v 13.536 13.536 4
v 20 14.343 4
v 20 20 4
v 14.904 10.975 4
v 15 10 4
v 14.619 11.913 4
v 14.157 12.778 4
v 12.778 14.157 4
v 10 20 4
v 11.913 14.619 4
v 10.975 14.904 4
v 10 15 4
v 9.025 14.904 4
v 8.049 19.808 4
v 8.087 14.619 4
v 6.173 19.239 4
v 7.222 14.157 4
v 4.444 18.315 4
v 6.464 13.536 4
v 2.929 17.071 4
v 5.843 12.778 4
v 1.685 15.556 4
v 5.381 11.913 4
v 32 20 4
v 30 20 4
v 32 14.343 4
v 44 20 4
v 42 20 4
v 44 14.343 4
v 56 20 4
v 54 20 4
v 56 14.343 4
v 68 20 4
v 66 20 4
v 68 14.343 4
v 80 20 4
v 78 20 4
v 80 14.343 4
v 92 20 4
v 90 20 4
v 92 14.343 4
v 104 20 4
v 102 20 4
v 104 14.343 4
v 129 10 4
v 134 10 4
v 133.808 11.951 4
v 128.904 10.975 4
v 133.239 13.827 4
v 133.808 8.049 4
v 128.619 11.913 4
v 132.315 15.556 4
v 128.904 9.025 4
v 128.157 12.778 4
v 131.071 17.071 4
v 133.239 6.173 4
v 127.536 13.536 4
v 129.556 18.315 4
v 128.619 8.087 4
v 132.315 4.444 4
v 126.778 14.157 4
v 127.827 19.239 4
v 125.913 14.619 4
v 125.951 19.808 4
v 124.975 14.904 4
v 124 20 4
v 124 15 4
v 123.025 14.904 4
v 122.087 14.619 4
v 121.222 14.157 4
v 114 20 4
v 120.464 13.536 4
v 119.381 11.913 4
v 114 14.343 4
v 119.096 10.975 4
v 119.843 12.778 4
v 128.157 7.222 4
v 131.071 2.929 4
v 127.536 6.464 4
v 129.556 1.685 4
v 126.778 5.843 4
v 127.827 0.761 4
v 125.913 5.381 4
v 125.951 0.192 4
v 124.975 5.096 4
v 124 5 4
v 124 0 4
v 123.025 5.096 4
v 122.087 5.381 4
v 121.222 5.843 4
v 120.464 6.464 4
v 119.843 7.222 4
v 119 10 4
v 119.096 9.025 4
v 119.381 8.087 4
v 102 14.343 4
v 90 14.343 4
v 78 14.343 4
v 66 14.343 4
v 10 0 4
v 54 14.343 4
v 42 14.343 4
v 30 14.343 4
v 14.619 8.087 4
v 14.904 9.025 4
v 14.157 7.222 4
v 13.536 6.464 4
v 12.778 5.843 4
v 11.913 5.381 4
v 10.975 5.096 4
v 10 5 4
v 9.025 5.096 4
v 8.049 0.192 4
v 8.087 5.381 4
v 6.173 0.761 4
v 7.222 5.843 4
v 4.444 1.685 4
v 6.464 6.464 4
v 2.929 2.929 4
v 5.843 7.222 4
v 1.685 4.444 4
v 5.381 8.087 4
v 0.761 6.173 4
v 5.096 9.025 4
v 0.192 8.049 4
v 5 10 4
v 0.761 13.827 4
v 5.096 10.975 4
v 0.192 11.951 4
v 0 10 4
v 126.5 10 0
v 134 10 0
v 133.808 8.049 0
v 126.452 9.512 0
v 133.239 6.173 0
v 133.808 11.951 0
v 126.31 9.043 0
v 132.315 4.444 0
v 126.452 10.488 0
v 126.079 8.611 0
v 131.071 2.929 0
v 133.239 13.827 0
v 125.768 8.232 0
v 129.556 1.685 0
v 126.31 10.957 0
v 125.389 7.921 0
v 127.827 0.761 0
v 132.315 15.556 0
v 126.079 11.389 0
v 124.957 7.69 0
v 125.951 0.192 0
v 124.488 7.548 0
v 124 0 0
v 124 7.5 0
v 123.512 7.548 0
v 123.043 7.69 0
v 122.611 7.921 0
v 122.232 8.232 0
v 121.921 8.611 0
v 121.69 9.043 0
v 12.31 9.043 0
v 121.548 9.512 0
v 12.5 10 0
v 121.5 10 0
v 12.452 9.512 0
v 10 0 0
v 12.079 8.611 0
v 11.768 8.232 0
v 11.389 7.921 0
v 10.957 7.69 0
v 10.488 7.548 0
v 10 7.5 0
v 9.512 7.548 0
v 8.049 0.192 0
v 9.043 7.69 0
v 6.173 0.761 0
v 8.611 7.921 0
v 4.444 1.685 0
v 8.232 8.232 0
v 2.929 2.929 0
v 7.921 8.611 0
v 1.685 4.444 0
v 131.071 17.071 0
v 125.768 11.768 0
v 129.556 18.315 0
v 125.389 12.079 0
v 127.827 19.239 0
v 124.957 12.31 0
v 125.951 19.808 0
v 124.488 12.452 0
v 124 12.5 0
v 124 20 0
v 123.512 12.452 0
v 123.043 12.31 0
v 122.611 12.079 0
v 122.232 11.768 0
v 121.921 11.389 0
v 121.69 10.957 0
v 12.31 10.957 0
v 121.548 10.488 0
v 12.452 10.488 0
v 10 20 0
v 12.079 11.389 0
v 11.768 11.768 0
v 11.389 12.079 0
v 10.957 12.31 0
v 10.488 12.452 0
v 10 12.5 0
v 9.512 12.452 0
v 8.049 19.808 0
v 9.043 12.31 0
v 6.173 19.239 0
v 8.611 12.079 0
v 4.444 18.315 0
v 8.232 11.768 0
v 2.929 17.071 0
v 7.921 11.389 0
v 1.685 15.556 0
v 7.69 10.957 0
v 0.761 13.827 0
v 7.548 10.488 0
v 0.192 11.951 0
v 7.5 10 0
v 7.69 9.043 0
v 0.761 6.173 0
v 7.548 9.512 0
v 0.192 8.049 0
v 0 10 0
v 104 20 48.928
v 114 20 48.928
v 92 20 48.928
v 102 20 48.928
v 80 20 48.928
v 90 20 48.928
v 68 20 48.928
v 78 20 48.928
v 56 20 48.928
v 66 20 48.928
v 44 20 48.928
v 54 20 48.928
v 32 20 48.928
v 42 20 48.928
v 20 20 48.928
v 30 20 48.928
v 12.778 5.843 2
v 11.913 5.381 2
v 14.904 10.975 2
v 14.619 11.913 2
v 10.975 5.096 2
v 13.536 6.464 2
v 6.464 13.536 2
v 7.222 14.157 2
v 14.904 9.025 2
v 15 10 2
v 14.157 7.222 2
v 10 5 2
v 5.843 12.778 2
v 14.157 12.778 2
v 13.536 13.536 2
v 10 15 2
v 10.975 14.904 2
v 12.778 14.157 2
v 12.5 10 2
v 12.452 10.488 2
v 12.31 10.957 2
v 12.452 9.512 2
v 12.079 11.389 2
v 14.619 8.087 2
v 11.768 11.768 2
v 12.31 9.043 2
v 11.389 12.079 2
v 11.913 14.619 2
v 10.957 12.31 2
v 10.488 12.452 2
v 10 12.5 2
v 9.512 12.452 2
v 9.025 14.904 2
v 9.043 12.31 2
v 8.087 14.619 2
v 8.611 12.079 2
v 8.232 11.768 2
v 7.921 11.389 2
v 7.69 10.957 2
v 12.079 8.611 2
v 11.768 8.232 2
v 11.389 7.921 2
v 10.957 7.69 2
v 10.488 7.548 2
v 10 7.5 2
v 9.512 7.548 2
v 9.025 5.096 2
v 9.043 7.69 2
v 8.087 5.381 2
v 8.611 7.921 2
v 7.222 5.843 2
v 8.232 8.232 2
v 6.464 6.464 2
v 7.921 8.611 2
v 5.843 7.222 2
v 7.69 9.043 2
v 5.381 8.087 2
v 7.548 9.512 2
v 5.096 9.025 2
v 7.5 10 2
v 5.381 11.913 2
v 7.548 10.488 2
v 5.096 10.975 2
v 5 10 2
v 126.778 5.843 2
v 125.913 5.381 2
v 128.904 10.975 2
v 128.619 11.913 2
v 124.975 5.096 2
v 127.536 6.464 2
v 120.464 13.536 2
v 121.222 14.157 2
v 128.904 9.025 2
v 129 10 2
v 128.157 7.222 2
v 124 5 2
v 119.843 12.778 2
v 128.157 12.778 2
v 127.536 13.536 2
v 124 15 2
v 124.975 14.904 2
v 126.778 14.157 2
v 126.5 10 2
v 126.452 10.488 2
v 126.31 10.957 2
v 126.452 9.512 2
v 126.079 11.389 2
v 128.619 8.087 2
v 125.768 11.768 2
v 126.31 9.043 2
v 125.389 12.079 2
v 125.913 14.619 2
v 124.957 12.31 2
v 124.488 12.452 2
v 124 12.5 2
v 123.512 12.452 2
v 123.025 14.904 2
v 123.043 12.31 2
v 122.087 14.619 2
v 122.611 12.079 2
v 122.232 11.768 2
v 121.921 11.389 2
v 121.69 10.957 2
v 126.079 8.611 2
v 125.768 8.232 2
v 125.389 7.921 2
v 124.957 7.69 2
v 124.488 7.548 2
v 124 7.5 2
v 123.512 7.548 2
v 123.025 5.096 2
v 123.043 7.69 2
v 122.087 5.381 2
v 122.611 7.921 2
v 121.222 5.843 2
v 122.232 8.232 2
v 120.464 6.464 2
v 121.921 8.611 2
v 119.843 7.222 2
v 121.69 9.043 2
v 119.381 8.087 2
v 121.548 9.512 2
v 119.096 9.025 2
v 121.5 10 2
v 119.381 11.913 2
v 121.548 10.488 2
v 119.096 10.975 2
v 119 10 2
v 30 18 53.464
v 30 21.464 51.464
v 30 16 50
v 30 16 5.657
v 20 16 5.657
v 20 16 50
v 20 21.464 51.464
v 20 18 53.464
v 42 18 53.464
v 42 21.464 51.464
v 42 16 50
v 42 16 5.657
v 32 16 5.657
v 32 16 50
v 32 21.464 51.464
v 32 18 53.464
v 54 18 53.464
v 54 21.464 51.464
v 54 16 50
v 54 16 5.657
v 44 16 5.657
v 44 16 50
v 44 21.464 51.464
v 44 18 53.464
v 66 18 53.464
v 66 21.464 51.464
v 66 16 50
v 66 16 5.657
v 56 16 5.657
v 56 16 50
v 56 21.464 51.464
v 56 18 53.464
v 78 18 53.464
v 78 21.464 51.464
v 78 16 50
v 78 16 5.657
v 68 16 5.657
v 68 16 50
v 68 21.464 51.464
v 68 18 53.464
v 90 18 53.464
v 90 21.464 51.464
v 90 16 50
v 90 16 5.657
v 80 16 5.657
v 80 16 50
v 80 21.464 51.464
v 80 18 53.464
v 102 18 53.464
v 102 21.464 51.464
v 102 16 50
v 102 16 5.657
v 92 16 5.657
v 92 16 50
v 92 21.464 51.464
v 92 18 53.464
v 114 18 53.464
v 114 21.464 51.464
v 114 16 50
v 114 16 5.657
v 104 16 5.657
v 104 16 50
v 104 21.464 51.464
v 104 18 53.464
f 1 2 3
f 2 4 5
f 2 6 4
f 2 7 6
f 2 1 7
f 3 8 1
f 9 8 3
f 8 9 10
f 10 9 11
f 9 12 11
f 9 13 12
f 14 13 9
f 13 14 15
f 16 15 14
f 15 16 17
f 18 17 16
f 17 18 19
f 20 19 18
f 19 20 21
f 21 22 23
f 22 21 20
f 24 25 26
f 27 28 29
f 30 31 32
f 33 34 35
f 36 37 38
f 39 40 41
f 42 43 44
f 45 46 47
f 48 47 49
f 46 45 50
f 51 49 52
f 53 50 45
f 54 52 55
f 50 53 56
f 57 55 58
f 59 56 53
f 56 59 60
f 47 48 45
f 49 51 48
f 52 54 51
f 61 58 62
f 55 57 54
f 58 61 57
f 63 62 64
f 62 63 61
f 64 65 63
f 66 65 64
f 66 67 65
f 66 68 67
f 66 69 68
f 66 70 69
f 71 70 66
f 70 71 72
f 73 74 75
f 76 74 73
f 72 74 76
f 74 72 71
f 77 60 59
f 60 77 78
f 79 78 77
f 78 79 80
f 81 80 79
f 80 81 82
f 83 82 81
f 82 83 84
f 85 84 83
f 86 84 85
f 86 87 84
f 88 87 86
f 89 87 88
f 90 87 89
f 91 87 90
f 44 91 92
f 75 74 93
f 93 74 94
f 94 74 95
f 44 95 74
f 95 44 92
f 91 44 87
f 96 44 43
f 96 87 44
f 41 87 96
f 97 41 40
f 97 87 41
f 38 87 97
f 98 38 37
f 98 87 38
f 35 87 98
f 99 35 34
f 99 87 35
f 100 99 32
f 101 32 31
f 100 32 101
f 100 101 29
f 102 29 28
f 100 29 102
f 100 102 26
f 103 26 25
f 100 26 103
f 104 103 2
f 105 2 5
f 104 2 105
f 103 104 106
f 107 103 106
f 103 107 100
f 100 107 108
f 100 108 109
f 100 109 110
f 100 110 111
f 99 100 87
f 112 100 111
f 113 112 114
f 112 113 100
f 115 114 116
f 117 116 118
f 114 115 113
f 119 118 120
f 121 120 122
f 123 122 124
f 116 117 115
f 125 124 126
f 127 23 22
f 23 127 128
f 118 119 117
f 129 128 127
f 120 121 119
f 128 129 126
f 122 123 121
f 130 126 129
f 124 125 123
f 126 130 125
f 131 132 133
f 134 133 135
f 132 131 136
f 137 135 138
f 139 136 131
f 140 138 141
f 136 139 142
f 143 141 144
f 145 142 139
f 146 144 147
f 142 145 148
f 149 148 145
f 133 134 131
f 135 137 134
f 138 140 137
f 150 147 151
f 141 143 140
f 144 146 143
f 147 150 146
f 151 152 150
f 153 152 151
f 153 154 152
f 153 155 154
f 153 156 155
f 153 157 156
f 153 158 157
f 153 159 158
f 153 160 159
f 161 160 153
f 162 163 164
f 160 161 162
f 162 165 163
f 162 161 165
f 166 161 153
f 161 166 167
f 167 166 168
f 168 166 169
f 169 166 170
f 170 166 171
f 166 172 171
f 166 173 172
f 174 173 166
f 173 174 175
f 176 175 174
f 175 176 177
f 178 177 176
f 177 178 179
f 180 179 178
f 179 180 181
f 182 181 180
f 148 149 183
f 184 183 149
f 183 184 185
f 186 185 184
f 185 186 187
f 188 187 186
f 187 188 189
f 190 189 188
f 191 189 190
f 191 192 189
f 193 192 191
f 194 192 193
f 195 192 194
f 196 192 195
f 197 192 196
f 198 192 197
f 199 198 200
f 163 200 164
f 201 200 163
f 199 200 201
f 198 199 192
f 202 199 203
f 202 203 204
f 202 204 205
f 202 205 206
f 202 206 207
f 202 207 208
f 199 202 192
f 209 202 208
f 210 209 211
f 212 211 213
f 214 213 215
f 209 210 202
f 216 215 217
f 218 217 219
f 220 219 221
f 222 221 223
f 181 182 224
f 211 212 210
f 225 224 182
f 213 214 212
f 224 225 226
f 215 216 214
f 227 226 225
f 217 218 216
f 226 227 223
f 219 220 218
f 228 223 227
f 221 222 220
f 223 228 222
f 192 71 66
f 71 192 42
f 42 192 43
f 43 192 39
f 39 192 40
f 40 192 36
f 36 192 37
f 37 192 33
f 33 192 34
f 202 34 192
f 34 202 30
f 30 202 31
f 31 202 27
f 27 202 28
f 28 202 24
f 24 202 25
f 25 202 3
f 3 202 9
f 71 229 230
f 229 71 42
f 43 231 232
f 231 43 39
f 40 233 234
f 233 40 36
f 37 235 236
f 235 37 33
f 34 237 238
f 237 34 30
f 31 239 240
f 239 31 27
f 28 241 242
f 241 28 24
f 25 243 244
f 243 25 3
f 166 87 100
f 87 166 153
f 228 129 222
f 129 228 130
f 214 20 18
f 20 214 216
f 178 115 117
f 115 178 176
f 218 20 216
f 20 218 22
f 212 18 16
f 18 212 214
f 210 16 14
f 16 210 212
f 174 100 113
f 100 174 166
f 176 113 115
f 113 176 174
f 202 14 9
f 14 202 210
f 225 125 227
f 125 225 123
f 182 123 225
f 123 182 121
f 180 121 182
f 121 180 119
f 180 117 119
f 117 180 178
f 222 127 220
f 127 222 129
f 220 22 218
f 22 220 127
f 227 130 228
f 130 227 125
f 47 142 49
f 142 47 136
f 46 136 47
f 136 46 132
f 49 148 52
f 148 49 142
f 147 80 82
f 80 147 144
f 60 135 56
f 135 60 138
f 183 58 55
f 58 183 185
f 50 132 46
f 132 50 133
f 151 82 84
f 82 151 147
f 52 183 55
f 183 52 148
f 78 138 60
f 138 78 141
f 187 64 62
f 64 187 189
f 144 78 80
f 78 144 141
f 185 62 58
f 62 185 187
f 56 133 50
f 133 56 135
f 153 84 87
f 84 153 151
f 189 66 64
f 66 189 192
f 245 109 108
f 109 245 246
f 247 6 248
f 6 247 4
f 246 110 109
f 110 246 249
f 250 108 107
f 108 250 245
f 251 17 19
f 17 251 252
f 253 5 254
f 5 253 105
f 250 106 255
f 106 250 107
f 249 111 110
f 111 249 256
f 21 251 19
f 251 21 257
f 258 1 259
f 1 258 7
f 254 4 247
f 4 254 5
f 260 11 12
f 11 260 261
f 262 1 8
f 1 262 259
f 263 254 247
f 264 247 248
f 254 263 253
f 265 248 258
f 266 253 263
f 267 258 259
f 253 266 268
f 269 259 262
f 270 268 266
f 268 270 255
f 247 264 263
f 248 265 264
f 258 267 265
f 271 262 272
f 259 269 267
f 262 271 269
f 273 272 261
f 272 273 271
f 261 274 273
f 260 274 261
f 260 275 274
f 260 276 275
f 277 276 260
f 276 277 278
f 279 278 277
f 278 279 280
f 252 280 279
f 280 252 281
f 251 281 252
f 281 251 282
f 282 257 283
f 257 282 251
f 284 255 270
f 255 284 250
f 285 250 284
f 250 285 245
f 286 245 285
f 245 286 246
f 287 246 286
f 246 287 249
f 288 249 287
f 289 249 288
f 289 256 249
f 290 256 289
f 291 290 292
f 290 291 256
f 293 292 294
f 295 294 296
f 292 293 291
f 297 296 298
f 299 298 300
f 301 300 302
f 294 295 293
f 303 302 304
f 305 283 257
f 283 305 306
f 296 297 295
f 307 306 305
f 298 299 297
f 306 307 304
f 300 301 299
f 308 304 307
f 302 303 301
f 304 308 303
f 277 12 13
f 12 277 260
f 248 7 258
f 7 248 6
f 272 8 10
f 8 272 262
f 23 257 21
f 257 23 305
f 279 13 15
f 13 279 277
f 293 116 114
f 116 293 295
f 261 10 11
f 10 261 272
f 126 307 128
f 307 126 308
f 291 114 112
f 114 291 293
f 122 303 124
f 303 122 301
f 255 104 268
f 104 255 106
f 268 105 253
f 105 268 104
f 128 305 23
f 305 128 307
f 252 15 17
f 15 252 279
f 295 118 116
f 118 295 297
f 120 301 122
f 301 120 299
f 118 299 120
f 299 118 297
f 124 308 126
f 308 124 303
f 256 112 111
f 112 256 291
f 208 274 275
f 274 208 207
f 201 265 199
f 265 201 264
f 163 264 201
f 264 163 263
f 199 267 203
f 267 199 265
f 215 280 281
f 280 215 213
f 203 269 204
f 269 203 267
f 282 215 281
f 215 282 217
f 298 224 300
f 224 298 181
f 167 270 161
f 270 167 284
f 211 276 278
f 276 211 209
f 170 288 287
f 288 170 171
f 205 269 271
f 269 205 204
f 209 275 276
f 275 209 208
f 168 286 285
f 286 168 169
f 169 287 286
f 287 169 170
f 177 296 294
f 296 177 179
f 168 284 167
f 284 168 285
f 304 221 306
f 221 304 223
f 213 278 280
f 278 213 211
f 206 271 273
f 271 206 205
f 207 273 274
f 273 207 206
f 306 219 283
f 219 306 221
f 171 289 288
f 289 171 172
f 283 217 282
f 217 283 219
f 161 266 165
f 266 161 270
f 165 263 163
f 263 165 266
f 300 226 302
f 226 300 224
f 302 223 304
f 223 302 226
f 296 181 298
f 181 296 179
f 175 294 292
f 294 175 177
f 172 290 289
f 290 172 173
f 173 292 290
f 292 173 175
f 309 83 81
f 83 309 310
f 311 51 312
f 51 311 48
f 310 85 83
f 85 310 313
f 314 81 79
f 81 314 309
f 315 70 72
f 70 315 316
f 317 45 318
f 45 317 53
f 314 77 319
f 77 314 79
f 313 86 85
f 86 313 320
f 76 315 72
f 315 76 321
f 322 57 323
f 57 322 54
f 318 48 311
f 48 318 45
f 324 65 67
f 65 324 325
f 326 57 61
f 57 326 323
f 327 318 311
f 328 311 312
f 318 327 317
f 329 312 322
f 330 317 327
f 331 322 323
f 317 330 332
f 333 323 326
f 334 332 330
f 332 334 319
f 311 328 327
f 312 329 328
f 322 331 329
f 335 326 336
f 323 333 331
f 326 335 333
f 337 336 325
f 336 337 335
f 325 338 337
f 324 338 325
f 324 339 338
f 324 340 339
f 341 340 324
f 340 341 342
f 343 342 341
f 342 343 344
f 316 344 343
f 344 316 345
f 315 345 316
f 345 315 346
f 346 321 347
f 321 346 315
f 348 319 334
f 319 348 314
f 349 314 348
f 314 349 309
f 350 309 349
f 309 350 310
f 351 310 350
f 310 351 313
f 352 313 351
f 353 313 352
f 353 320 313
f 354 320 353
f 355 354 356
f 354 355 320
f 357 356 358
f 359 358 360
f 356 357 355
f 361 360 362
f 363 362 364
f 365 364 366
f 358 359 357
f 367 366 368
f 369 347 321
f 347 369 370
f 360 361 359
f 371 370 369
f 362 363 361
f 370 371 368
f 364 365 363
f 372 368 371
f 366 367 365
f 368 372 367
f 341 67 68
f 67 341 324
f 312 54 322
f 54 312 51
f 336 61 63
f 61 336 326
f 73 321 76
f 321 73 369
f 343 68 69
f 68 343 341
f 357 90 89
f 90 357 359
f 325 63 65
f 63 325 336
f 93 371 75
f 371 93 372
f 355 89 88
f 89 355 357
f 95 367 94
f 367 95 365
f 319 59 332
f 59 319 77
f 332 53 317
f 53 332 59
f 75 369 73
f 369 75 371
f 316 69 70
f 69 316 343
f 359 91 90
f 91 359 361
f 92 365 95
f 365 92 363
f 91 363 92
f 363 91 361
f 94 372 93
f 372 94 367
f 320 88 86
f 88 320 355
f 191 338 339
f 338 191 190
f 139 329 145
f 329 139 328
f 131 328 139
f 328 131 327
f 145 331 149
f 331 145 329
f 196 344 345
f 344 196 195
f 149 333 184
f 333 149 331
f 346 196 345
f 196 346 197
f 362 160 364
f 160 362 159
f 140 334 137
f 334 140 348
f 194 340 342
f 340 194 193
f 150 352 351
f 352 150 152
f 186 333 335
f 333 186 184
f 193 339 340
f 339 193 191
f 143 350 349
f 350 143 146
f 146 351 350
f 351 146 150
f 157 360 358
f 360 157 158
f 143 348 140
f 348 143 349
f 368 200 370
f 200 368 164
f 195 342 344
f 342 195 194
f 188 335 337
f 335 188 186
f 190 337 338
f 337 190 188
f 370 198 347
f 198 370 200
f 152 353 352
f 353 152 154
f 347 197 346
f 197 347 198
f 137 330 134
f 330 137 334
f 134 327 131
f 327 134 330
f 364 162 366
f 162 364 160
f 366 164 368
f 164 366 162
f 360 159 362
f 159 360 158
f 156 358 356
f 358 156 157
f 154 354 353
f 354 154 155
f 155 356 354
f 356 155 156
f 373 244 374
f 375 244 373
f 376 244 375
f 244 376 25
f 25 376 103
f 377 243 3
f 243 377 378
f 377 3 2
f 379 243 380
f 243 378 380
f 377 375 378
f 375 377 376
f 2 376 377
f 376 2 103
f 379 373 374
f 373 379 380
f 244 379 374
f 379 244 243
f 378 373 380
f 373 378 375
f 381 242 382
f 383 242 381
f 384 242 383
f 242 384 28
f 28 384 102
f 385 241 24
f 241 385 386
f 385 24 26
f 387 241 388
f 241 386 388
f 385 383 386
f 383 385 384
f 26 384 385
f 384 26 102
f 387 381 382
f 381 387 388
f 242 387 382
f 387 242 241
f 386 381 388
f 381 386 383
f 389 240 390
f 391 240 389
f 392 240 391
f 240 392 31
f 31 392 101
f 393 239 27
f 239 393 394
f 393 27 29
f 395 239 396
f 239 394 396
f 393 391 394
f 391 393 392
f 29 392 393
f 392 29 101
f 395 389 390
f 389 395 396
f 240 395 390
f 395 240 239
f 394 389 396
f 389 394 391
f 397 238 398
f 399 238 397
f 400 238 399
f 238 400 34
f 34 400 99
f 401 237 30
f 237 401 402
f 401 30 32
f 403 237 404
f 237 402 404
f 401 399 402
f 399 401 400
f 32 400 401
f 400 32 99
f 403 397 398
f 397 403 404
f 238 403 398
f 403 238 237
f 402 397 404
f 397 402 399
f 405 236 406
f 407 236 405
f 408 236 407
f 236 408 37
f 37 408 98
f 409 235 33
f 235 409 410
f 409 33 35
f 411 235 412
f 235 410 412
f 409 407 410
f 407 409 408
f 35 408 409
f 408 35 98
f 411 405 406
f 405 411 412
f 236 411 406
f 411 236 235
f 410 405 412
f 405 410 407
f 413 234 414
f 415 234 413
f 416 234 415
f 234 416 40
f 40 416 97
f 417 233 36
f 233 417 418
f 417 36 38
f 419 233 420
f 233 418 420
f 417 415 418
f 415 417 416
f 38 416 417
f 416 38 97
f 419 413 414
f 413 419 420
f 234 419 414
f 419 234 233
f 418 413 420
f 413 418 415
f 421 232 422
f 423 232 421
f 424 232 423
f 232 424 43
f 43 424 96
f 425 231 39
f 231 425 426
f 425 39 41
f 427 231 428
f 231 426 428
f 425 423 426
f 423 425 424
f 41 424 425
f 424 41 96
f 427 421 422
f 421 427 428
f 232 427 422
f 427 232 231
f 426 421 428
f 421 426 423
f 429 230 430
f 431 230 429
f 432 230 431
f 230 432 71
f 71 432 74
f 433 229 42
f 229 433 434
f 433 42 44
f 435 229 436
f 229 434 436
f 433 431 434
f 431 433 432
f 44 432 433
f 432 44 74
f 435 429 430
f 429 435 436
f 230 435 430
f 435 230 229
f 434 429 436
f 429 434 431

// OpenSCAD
// This script creates a wire rack with a variable number of tines

$fn = 32+1-1;	// Dummy math to avoid showing in customizer.

// Number of tines
N = 8;			// [2:20]
tine_width = 10;
tine_height = 4+1-1;
tine_length = 50;
tine_pitch = 12;

base_height = 20;
base_width = base_height*2 + (N-1)*(tine_pitch) + tine_width;
base_thickness = 4+1-1;

echo("<b>Base width [mm]:", base_width);

countersink_diameter = 10;
hole_diameter = 5;

difference()
{
	// Baseplate
	union()
	{
		translate([base_height/2,0,0]) cube([base_width-base_height,base_height,base_thickness]);
		translate([base_height/2,base_height/2,0]) cylinder(base_thickness,base_height/2,base_height/2);
		translate([base_width-base_height/2,base_height/2,0]) cylinder(base_thickness,base_height/2,base_height/2);		
	}

	// Screw holes
	for (i = [0:1])
	{
		translate([base_height/2+(base_width-base_height)*i,base_height/2,4])
		{
			union()
			{
				// Countersink
				cylinder(base_thickness,countersink_diameter/2,countersink_diameter/2,true);

				// Screw hole
				cylinder(base_thickness*3,hole_diameter/2,hole_diameter/2,true);
			}

		}
	}

	// Text
	/*translate([base_width/2-10.75*2.4,2,base_thickness-1])
		scale([12,12,2])
			import("WireRackText.stl");*/
}

// Tines
for (i = [0:(N-1)])
{
	// Tine
	translate([base_height + tine_pitch*i, base_height - tine_height, 0])
		cube([tine_width,tine_height,tine_length]);

	// Tine support
	translate([base_height + tine_pitch*i, base_height-tine_height, 0])
		rotate([45, 0, 0])
			cube([tine_width, tine_height, tine_height]);

	// Upturned tine end
	translate([base_height+tine_pitch*i,base_height-tine_height,tine_length])
		rotate([-30,0,0])
			cube([tine_width,tine_height,tine_height]);
}
